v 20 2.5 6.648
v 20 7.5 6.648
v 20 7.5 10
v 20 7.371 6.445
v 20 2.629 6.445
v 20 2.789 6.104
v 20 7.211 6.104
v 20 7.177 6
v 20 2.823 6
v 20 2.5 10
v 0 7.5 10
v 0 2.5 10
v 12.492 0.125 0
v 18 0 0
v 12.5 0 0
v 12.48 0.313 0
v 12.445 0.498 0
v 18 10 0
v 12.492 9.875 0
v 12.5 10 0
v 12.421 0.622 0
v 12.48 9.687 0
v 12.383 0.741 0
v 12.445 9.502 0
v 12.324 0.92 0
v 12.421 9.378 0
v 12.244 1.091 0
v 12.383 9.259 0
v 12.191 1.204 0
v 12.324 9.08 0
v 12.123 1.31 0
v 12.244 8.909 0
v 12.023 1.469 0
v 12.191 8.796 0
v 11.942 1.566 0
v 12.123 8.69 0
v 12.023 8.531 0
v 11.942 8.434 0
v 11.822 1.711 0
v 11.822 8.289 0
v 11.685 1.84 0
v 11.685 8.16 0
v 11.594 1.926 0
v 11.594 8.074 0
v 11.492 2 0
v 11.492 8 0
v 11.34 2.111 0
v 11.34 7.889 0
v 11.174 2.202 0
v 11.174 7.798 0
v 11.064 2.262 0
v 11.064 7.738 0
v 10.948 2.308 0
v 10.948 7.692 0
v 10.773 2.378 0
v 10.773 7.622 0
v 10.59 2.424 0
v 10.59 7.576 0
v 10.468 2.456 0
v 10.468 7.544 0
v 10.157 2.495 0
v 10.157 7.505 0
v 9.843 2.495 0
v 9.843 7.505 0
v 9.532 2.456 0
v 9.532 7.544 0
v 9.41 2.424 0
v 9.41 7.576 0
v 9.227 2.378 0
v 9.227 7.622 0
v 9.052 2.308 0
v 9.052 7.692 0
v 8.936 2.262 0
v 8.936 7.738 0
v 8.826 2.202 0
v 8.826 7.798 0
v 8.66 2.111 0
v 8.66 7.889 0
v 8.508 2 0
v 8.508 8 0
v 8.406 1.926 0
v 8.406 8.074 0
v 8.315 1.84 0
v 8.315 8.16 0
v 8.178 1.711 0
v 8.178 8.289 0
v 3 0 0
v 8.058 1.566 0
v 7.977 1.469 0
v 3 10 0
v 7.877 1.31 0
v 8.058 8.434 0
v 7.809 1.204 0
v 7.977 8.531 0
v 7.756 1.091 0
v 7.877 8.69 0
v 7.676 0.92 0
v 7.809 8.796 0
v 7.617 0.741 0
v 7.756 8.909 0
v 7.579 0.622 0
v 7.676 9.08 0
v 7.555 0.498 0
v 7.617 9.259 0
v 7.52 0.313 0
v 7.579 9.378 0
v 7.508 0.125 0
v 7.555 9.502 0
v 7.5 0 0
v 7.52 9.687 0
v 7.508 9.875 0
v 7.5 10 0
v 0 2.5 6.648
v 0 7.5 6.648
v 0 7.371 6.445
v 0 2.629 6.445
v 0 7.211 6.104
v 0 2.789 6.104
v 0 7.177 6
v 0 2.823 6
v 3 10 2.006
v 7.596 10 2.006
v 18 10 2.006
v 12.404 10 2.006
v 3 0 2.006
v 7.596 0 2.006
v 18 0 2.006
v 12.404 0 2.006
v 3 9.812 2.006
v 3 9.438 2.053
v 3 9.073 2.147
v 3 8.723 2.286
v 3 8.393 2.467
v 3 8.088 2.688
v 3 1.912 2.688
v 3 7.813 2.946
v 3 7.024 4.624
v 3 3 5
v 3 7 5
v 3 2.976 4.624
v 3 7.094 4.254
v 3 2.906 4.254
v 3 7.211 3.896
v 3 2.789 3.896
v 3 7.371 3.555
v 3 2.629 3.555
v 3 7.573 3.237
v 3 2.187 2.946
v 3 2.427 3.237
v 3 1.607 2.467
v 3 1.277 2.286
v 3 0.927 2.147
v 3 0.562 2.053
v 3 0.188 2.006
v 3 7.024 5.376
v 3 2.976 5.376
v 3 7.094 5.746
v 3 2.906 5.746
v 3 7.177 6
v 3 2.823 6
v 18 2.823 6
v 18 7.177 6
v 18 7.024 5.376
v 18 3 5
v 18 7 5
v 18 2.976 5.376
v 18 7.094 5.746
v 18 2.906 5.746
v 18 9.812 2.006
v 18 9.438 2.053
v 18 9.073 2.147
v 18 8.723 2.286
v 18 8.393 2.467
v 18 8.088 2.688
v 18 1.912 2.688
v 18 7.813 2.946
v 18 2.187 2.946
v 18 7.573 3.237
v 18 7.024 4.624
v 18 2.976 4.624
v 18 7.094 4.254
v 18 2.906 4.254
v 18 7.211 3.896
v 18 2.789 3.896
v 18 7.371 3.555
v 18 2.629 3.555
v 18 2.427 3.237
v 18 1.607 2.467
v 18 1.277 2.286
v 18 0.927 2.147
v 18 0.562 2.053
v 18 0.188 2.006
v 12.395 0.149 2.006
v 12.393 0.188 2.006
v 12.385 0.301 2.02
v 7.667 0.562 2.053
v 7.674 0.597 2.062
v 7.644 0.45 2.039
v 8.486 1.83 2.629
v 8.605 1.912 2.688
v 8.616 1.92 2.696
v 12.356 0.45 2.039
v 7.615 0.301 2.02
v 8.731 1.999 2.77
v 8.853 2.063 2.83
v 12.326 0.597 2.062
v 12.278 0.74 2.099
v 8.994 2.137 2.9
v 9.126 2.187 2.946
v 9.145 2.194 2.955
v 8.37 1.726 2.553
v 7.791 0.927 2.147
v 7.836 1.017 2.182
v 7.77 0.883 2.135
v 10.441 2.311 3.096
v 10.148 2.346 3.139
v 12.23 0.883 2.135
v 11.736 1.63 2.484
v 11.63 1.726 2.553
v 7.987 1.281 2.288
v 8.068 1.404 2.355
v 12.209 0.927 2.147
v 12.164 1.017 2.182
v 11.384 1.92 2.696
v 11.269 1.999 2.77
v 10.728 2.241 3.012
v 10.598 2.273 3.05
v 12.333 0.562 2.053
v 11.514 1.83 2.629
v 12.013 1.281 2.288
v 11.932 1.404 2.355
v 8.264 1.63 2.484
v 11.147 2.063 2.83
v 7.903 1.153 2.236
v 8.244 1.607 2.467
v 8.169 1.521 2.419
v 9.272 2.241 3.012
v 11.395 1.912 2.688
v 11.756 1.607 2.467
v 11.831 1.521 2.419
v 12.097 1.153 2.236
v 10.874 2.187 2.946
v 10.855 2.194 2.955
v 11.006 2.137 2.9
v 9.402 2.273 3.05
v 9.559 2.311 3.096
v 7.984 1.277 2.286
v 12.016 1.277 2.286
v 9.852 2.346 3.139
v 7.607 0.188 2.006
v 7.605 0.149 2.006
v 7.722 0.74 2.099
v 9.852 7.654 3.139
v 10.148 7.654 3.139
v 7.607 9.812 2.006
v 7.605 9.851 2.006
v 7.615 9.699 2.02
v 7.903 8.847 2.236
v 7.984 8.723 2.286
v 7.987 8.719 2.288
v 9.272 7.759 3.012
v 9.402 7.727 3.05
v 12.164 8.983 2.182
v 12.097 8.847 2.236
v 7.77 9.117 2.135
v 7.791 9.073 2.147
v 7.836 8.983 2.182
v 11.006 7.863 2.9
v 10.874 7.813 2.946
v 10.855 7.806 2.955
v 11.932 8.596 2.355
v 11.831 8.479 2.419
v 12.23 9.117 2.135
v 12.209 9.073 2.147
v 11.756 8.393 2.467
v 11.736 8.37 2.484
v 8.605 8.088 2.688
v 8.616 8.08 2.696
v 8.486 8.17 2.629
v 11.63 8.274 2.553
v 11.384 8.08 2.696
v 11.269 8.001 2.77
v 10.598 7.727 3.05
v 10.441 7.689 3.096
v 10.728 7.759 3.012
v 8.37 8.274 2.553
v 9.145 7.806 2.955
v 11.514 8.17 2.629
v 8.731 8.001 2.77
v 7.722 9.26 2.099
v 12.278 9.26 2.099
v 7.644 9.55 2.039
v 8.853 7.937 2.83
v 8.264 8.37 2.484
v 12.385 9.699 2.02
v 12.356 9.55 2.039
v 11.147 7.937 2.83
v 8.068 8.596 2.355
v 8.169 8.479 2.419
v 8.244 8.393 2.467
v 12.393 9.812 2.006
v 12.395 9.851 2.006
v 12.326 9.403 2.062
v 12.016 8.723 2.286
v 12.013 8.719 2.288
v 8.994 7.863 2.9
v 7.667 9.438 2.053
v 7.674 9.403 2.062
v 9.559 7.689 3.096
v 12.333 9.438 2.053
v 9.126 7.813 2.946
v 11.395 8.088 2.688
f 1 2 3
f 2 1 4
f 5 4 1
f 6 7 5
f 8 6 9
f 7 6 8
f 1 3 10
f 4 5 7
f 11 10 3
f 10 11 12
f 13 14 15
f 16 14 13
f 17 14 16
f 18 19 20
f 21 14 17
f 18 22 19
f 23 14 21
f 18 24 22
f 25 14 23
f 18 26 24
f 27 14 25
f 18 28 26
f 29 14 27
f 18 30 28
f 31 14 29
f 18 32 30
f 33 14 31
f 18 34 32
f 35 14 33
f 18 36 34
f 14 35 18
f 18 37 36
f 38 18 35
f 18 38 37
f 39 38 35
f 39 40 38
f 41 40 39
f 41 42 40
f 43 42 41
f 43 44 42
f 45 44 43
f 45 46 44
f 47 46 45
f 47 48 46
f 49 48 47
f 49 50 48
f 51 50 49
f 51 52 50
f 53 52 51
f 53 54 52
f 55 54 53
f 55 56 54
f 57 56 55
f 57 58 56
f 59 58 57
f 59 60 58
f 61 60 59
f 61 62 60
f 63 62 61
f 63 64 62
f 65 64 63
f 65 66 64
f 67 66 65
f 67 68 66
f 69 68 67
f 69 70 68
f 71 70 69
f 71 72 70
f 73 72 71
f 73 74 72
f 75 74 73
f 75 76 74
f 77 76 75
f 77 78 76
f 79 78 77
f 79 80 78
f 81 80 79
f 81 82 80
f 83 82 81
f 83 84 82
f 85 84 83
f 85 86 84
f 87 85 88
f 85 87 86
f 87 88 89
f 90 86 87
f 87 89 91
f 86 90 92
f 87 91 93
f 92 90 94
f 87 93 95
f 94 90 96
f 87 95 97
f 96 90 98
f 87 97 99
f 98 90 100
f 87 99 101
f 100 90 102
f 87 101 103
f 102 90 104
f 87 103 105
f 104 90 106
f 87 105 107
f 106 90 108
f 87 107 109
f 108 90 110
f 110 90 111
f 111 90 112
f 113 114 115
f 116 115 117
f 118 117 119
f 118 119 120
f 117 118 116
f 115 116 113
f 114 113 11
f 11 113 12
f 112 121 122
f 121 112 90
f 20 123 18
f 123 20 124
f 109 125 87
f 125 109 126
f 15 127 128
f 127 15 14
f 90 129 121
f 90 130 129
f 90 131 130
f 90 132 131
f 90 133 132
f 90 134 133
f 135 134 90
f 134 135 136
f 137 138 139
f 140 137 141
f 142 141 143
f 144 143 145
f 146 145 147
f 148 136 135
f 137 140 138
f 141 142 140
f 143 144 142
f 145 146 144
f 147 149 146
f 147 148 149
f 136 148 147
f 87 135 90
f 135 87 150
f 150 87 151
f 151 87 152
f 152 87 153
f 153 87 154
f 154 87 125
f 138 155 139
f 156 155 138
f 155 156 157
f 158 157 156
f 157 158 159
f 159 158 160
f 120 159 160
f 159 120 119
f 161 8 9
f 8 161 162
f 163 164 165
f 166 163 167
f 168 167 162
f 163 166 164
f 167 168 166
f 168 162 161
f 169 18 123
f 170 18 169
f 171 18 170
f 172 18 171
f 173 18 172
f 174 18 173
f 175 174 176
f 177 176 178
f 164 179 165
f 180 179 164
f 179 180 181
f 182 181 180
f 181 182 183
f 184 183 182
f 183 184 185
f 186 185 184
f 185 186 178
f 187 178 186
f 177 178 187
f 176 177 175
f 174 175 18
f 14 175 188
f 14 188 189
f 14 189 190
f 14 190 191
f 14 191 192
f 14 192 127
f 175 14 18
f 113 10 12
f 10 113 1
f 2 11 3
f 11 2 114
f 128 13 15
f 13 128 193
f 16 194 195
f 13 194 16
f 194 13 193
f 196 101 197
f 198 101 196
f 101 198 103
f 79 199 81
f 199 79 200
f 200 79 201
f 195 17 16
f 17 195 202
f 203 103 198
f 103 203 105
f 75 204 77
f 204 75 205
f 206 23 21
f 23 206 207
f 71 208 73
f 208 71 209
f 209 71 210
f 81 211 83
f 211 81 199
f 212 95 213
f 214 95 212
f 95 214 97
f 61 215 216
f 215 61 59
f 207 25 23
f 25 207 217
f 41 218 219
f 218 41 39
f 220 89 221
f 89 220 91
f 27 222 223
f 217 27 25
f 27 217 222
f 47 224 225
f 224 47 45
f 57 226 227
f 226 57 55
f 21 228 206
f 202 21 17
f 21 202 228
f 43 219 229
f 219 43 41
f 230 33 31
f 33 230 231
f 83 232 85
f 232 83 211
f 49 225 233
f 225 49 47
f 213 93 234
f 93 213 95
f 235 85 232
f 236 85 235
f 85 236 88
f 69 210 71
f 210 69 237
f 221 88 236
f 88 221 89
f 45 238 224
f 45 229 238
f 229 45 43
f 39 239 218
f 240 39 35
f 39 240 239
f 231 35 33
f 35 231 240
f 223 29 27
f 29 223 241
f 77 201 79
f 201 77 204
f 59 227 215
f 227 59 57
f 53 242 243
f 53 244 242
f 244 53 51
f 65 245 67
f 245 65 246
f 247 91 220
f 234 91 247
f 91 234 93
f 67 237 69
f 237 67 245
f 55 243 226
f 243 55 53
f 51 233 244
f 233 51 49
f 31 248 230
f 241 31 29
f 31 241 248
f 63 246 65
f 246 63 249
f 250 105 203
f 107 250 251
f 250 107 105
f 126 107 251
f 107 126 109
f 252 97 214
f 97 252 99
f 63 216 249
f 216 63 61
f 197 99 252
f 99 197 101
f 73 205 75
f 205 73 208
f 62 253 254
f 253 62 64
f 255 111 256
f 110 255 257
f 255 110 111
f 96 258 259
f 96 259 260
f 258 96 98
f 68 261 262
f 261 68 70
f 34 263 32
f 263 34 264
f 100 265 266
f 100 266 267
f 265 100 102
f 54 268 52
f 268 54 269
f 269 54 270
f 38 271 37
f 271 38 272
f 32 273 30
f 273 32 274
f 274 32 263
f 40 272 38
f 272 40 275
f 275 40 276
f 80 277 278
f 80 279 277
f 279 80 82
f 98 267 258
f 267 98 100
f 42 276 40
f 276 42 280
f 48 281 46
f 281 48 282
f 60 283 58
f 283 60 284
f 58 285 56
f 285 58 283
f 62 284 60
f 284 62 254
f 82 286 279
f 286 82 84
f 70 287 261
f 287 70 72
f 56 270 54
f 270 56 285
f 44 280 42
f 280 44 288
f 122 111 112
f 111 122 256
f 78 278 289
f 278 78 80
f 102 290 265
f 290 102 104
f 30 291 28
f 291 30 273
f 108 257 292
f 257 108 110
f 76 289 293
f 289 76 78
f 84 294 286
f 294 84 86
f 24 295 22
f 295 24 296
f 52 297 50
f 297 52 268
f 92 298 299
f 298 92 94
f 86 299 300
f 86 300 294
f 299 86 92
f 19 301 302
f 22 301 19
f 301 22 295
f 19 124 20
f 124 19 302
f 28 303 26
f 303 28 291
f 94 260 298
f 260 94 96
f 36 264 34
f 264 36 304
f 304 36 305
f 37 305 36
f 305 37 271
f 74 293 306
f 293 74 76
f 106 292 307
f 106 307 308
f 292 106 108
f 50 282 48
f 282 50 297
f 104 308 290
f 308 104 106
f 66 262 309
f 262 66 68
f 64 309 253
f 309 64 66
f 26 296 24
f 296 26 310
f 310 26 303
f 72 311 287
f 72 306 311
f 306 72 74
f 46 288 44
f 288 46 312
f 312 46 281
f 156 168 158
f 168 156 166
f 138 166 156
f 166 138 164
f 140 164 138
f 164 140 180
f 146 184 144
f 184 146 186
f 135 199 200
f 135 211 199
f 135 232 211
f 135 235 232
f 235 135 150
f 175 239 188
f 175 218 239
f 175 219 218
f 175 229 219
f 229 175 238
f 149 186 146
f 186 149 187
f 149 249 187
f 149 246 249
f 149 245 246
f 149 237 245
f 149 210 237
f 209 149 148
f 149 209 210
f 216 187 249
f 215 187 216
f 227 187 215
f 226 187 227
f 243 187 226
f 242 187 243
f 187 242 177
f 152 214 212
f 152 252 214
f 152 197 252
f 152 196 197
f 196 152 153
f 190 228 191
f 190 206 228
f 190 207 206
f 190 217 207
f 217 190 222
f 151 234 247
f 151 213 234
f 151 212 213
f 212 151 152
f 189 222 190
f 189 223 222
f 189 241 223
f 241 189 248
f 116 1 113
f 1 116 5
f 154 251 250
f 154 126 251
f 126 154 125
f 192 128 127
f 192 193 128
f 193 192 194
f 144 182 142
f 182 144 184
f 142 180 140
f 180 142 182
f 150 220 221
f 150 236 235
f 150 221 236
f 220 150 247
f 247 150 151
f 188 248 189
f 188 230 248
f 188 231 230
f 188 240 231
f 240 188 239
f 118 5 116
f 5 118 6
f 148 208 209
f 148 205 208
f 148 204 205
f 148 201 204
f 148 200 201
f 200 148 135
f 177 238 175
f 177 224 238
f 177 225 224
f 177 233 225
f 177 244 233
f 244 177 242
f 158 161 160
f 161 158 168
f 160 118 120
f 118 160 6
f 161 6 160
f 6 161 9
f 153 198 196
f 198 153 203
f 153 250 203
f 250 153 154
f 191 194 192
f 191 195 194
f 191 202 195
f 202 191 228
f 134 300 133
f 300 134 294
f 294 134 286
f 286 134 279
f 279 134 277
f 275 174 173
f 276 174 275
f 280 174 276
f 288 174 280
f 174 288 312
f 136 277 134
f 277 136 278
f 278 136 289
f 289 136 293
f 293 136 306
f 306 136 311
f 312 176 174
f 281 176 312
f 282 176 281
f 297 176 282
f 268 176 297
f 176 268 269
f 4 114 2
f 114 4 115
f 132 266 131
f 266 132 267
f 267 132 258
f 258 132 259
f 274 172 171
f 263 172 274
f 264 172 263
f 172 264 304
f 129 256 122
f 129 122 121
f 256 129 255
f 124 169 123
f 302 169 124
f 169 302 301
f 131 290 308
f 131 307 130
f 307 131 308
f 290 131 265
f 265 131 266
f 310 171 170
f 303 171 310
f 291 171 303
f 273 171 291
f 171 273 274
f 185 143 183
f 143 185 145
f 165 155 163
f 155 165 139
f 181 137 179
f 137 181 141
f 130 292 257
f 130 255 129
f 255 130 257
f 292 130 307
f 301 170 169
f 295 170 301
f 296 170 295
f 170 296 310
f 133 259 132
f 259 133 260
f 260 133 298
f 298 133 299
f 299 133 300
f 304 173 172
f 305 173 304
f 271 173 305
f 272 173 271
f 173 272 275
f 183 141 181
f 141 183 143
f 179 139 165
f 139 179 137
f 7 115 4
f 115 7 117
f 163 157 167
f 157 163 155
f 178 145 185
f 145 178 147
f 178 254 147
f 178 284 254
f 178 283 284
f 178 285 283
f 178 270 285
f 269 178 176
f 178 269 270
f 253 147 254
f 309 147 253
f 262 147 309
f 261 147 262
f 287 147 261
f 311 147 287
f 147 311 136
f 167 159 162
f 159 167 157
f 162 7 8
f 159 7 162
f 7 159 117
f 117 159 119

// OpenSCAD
$fn=50;

difference() {
  cube([20,10,10]);
  translate([-1, -1, -1]) {
      cube([4,12,7]);
  }
  translate([18, -1, -1]) {
      cube([3,12,7]);
  }
  translate([-1, -1, 6]) {
      cube([22,3.5,6]);
  }
  translate([-1, 7.5, 6]) {
      cube([22,3,6]);
  }
  translate([10, 0, 0]) {
      cylinder(21, 3, 2, true);
  }
  translate([10, 10, 0]) {
      cylinder(21, 3, 2, true);
  }
  translate([0, 0, 5]) {
      rotate([90, 0, 90]){
          cylinder(44, 3, 3, true);
      }
  }
  translate([0, 10, 5]) {
      rotate([90, 0, 90]){
          cylinder(44, 3, 3, true);
      }
  }
  translate([0, 5, 0]) {
      rotate([0, 0, 90]){
          cylinder(12, 3, 3, true);
      }
  }
}
